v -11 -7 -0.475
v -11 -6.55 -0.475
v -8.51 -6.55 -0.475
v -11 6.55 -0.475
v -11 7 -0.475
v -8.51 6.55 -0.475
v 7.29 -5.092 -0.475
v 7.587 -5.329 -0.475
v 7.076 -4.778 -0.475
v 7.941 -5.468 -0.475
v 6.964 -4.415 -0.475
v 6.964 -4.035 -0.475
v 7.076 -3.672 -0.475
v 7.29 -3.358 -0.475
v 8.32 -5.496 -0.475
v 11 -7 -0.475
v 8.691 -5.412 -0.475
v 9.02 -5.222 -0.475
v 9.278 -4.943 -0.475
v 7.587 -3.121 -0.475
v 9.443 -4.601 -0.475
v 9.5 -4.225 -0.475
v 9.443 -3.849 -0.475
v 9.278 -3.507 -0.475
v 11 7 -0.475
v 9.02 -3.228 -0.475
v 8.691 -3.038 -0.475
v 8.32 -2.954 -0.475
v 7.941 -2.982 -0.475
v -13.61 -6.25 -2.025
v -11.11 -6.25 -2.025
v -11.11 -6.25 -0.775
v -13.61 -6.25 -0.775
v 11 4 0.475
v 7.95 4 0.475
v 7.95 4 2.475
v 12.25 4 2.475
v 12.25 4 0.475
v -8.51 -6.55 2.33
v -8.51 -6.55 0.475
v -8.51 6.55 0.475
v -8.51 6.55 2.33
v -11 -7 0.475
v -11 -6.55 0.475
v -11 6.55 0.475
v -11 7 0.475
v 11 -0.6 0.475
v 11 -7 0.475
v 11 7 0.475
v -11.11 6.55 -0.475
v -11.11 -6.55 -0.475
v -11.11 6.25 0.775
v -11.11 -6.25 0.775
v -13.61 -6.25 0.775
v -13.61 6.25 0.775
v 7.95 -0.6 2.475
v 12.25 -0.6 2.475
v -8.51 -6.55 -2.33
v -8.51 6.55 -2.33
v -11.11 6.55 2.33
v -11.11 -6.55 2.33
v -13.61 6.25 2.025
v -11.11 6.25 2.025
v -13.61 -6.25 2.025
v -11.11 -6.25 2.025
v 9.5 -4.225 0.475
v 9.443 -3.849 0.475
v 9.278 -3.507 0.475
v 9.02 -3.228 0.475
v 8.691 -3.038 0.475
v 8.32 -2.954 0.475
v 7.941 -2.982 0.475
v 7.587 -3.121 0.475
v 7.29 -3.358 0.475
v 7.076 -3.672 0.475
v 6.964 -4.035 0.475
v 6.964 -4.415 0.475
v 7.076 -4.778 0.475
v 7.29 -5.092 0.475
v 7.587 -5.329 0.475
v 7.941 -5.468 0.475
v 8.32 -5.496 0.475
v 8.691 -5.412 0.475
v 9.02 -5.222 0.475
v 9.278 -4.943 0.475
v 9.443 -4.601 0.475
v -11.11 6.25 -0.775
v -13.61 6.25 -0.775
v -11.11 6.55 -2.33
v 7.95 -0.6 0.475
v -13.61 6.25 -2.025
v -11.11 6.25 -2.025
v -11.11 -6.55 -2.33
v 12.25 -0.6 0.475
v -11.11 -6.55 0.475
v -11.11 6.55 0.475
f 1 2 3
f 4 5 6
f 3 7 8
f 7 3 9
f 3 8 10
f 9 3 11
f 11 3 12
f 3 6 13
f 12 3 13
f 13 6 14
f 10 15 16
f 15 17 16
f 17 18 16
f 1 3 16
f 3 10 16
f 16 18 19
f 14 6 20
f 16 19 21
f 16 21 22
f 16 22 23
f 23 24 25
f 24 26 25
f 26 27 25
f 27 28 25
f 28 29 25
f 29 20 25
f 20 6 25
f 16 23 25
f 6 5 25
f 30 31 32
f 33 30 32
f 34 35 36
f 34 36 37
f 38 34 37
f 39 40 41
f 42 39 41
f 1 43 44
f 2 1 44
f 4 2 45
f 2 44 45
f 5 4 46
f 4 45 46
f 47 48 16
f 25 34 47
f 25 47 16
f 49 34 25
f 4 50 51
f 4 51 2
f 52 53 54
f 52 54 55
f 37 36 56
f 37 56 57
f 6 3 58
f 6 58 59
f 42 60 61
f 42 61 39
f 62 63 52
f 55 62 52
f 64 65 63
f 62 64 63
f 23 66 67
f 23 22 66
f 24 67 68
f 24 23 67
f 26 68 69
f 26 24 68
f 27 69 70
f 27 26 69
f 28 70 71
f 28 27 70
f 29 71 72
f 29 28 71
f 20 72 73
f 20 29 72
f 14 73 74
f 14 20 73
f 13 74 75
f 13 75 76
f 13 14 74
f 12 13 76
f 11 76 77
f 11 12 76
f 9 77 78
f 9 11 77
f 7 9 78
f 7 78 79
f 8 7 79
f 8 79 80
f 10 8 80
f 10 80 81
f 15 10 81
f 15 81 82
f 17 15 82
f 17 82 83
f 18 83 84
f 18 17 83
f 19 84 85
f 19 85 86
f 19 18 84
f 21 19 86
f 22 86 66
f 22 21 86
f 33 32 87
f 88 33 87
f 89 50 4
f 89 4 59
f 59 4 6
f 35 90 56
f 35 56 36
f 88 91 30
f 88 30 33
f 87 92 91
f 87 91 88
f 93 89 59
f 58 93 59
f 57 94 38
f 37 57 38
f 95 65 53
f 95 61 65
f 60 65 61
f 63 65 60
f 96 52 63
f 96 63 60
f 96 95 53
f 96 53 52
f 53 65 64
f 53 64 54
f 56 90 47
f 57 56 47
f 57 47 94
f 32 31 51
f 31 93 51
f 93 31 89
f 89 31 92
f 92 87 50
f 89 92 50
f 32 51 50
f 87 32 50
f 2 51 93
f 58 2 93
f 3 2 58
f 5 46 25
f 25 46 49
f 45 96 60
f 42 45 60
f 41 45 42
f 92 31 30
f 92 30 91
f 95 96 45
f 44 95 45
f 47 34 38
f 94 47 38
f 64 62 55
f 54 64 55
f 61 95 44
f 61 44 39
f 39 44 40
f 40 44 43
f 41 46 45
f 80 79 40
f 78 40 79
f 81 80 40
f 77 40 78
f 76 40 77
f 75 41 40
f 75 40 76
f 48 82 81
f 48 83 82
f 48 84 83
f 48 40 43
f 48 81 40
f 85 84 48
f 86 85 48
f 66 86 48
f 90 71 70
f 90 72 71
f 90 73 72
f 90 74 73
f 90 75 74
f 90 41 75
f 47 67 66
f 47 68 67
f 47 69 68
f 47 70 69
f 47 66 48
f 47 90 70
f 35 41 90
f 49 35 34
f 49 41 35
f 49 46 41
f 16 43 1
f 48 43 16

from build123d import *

# Parameters (mm, degrees)
SKETCH1_W           = 22
SKETCH1_H           = 14
SKETCH1_R           = 1.275
BOSS_EXTRUDE1_DEPTH = 0.475
SKETCH2_W           = 2.6
SKETCH2_H           = 13.1
BOSS_EXTRUDE2_DEPTH = 1.855
SKETCH3_W           = 1.25
SKETCH3_H           = 12.5
BOSS_EXTRUDE3_DEPTH = 2.5
SKETCH4_W           = 4.3
SKETCH4_H           = 4.6
BOSS_EXTRUDE4_DEPTH = 2


with BuildPart() as part:
    # Sketch1 → Boss-Extrude1 (new body, symmetric)
    with BuildSketch(Plane.XY):
        Rectangle(SKETCH1_W, SKETCH1_H)
        with Locations((8.225, -4.225)):
            Circle(SKETCH1_R, mode=Mode.SUBTRACT)
    extrude(amount=BOSS_EXTRUDE1_DEPTH, both=True)

    # Sketch2 → Boss-Extrude2 (add)
    with BuildSketch(Plane.XY.offset(0.475)):
        with Locations((-9.81, 0)):
            Rectangle(SKETCH2_W, SKETCH2_H)
    boss_extrude2 = extrude(amount=BOSS_EXTRUDE2_DEPTH)

    # Mirror1: Boss-Extrude2 across plane
    add(boss_extrude2.mirror(Plane.XY))

    # Sketch3 → Boss-Extrude3 (add)
    with BuildSketch(Plane.ZY.offset(11.11)):
        with Locations((-1.4, 0)):
            Rectangle(SKETCH3_W, SKETCH3_H)
    boss_extrude3 = extrude(amount=BOSS_EXTRUDE3_DEPTH)

    # Mirror2: Boss-Extrude3 across plane
    add(boss_extrude3.mirror(Plane.XY))

    # Sketch4 → Boss-Extrude4 (add)
    with BuildSketch(Plane.XY.offset(0.475)):
        with Locations((10.1, 1.7)):
            Rectangle(SKETCH4_W, SKETCH4_H)
    extrude(amount=BOSS_EXTRUDE4_DEPTH)


solid = part.part
